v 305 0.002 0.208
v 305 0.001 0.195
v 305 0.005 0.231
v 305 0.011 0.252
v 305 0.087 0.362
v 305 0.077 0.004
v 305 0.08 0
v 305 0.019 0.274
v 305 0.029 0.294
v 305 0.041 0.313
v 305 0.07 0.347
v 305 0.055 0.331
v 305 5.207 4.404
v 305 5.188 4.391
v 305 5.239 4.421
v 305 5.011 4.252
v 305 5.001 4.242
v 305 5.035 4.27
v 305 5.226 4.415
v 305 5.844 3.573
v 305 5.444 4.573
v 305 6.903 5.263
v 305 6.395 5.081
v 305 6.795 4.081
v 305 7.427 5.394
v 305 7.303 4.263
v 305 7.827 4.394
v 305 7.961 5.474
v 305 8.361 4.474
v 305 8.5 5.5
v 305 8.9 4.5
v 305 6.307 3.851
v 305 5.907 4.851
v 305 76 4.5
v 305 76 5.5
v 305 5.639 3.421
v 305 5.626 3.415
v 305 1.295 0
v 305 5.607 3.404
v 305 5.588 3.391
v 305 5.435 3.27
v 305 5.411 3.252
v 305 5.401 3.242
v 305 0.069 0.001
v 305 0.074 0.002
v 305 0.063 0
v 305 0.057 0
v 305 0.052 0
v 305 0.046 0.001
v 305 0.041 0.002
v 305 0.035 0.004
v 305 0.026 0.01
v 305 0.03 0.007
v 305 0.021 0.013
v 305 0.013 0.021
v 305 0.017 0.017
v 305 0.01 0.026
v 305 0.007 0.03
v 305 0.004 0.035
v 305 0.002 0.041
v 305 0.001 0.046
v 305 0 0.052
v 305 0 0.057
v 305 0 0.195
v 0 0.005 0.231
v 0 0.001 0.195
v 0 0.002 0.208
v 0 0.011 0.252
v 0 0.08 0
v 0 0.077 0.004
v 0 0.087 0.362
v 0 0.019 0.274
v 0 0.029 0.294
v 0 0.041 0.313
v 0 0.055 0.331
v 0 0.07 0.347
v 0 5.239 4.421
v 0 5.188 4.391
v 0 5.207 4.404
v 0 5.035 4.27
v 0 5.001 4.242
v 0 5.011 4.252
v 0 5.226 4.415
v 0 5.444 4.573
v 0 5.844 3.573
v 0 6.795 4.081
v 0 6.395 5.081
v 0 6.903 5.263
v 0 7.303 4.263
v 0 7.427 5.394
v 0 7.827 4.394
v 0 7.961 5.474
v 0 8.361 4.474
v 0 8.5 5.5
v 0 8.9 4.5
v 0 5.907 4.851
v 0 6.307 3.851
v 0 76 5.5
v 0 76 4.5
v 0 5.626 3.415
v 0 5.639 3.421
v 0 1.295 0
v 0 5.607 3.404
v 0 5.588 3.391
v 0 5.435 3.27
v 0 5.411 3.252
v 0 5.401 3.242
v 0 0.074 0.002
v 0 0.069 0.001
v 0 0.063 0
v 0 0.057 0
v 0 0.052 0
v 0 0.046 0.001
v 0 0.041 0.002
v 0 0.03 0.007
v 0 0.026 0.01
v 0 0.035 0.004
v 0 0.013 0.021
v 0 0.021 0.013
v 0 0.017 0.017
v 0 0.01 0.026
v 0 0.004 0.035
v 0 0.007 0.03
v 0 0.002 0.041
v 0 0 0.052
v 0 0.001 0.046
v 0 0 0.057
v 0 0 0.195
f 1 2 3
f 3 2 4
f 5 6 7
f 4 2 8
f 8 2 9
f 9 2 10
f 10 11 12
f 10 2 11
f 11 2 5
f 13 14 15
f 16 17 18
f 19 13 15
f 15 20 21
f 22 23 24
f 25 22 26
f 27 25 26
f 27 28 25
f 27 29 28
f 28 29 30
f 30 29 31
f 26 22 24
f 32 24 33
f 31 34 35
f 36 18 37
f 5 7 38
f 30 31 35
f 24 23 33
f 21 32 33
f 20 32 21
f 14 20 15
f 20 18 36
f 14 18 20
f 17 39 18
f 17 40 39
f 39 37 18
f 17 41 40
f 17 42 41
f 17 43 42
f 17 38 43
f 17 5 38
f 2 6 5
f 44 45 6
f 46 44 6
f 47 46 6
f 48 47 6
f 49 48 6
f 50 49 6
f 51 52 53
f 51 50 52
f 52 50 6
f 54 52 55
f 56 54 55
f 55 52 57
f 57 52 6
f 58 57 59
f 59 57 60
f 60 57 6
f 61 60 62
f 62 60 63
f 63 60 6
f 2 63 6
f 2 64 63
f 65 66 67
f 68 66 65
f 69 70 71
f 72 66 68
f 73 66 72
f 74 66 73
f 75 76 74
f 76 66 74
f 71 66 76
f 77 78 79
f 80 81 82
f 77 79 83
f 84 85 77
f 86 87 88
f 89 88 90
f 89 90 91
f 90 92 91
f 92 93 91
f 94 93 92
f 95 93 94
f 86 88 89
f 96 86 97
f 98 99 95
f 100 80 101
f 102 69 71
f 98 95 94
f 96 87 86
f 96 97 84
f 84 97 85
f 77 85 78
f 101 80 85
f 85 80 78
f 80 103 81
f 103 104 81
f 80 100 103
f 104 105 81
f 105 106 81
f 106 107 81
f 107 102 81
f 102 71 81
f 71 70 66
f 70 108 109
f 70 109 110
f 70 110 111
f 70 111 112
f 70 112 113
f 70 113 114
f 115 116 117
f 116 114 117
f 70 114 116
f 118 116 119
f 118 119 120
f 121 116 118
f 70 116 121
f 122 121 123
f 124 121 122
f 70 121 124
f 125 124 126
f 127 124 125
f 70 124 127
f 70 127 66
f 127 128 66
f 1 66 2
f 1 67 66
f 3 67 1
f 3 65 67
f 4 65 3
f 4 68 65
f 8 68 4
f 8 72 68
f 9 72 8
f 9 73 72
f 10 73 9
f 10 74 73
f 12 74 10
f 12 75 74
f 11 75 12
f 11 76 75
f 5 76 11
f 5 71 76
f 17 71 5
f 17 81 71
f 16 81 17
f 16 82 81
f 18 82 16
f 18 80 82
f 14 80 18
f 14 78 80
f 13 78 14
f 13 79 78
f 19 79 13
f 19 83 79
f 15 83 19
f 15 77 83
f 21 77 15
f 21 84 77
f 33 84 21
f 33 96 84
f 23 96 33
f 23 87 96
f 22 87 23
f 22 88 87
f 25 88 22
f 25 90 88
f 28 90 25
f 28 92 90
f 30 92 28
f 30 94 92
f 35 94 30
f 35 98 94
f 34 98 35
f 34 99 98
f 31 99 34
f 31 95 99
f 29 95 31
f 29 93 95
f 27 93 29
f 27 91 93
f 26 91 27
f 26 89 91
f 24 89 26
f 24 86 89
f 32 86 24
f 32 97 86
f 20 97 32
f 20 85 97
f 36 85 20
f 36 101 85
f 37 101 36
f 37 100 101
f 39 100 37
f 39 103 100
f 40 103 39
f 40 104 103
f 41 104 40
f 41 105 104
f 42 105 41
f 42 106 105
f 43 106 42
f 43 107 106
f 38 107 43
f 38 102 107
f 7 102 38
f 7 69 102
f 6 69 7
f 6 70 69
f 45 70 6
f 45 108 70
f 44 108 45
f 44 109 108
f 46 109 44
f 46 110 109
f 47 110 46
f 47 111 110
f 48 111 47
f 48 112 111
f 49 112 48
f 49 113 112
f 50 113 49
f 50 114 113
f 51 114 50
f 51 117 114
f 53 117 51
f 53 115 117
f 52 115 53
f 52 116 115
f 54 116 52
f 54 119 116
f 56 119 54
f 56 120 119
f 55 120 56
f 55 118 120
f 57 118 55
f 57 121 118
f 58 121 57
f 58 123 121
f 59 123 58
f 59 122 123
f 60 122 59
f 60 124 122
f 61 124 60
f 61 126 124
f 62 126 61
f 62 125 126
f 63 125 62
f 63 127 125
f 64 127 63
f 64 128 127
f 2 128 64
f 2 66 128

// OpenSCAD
// X230_palmrest.scad 
// Designed by: Arial Hamed 🏳️‍🌈
// Created: 2023-May-20
// Description: Replacement palmrest without touchpad for X230, X230i, X230 Tablet & X230i Tablet.
// Released as FOSS. If this file is not distributed under GNU-GPL, please contact me via arifhamed.arial@outlook.com
echo(version=version());

// 1 = 1mm, 16.9 = 16.9mm, 1 unit is 1 milimetre. The following values here are real metrics, except for real_z, which is based off an estimation. The real lid is made out of metal, and I do not have vernier calipers.
ansi=0.23; // This value is for deburring the model (remove sharp edges), using minkowski function here in OpenSCAD, following ANSI Z359.14 standard, to a minimum of 0.127mm (0.005 inches). I think that's what it means anyway ¯\_(ツ)_/¯ i just don't want my models to hurt anyone. 
allowance=0.001; // This value is for when I really want to make sure that shapes connect

// Signature
module signature(sign_x, sign_y, sign_z, sign_depth, sign_size=1){ translate([sign_x, sign_y, sign_z]) linear_extrude(height=sign_depth) offset(r=0.01){  scale([(1/20)*sign_size,.05*sign_size,.05*sign_size]){ polygon([[0,0],[8,16],[16,0],[15,0],[8,14],[1,0]]); polygon([[15,0],[4,7],[4,8],[15,1]]); polygon([[4,7],[17,7],[17,7.8],[17,7],[17,7.8],[4,7.8]]); polygon([[16.9,7],[8.9,14],[8,16],[20,16],[19,15.2],[9,15.2],[17,8],[18,7]]); polygon([[5.8,17.8],[5,20],[4.2,17.8],[6.1,19.23],[3.9,19.23]]); translate([0,(-sign_size/3.5)/5*7.5,0]) text("arial hamed", size=sign_size/3.5, font="Liberation Mono");  } } }

module palmrestFunctional(main_x, main_y, main_z) {
	module curvedLayer() { 
		translate([0, 8.5]) square([main_z, main_y-8.5]); // Main long boi
		rotate([0,0,51.7]) translate([ansi*1.274,0]) minkowski(){square([1+main_z, 6.5]); circle(ansi);}// Angled short boi
		translate([0, 8.5]) circle(main_z); // Round smooth boi
	}
	translate([main_x,0,0]) rotate([0,-90,0]) linear_extrude(main_x){ // Extrude and rotate 2D curvedLayer
		difference(){
			union(){
				difference(){
					curvedLayer(); // Upper surface
					translate([-1,.4,0]) curvedLayer(); // Hollow the upper surface to creater the lower surface
				}
				translate([ansi/4, 0]) square([ansi*.6,ansi*.6]); // Vertical body
				translate([ansi/4, ansi/4]) circle(ansi/4); // Slightly small curve at the bottom of the vertical
			}
			translate([-2,0]) square([2,2]); // Trim off the front edge
		}
	}
}

module palmrestDetailed(main_x, main_y, main_z) {
	palmrestFunctional(main_x, main_y, main_z);
}

module palmrestFinal(main_x, main_y, main_z) {
	palmrestDetailed(main_x, main_y, main_z);
}

real_x = 305;
real_y = 76;
real_z = 5.5;
$fn = 64; // Resolution for arcs in spheres, cylinders & circles. Higher res means more smoother models & more accurate models dimensions, at the cost of machine performance (duh)

palmrestFinal(real_x, real_y, real_z);
